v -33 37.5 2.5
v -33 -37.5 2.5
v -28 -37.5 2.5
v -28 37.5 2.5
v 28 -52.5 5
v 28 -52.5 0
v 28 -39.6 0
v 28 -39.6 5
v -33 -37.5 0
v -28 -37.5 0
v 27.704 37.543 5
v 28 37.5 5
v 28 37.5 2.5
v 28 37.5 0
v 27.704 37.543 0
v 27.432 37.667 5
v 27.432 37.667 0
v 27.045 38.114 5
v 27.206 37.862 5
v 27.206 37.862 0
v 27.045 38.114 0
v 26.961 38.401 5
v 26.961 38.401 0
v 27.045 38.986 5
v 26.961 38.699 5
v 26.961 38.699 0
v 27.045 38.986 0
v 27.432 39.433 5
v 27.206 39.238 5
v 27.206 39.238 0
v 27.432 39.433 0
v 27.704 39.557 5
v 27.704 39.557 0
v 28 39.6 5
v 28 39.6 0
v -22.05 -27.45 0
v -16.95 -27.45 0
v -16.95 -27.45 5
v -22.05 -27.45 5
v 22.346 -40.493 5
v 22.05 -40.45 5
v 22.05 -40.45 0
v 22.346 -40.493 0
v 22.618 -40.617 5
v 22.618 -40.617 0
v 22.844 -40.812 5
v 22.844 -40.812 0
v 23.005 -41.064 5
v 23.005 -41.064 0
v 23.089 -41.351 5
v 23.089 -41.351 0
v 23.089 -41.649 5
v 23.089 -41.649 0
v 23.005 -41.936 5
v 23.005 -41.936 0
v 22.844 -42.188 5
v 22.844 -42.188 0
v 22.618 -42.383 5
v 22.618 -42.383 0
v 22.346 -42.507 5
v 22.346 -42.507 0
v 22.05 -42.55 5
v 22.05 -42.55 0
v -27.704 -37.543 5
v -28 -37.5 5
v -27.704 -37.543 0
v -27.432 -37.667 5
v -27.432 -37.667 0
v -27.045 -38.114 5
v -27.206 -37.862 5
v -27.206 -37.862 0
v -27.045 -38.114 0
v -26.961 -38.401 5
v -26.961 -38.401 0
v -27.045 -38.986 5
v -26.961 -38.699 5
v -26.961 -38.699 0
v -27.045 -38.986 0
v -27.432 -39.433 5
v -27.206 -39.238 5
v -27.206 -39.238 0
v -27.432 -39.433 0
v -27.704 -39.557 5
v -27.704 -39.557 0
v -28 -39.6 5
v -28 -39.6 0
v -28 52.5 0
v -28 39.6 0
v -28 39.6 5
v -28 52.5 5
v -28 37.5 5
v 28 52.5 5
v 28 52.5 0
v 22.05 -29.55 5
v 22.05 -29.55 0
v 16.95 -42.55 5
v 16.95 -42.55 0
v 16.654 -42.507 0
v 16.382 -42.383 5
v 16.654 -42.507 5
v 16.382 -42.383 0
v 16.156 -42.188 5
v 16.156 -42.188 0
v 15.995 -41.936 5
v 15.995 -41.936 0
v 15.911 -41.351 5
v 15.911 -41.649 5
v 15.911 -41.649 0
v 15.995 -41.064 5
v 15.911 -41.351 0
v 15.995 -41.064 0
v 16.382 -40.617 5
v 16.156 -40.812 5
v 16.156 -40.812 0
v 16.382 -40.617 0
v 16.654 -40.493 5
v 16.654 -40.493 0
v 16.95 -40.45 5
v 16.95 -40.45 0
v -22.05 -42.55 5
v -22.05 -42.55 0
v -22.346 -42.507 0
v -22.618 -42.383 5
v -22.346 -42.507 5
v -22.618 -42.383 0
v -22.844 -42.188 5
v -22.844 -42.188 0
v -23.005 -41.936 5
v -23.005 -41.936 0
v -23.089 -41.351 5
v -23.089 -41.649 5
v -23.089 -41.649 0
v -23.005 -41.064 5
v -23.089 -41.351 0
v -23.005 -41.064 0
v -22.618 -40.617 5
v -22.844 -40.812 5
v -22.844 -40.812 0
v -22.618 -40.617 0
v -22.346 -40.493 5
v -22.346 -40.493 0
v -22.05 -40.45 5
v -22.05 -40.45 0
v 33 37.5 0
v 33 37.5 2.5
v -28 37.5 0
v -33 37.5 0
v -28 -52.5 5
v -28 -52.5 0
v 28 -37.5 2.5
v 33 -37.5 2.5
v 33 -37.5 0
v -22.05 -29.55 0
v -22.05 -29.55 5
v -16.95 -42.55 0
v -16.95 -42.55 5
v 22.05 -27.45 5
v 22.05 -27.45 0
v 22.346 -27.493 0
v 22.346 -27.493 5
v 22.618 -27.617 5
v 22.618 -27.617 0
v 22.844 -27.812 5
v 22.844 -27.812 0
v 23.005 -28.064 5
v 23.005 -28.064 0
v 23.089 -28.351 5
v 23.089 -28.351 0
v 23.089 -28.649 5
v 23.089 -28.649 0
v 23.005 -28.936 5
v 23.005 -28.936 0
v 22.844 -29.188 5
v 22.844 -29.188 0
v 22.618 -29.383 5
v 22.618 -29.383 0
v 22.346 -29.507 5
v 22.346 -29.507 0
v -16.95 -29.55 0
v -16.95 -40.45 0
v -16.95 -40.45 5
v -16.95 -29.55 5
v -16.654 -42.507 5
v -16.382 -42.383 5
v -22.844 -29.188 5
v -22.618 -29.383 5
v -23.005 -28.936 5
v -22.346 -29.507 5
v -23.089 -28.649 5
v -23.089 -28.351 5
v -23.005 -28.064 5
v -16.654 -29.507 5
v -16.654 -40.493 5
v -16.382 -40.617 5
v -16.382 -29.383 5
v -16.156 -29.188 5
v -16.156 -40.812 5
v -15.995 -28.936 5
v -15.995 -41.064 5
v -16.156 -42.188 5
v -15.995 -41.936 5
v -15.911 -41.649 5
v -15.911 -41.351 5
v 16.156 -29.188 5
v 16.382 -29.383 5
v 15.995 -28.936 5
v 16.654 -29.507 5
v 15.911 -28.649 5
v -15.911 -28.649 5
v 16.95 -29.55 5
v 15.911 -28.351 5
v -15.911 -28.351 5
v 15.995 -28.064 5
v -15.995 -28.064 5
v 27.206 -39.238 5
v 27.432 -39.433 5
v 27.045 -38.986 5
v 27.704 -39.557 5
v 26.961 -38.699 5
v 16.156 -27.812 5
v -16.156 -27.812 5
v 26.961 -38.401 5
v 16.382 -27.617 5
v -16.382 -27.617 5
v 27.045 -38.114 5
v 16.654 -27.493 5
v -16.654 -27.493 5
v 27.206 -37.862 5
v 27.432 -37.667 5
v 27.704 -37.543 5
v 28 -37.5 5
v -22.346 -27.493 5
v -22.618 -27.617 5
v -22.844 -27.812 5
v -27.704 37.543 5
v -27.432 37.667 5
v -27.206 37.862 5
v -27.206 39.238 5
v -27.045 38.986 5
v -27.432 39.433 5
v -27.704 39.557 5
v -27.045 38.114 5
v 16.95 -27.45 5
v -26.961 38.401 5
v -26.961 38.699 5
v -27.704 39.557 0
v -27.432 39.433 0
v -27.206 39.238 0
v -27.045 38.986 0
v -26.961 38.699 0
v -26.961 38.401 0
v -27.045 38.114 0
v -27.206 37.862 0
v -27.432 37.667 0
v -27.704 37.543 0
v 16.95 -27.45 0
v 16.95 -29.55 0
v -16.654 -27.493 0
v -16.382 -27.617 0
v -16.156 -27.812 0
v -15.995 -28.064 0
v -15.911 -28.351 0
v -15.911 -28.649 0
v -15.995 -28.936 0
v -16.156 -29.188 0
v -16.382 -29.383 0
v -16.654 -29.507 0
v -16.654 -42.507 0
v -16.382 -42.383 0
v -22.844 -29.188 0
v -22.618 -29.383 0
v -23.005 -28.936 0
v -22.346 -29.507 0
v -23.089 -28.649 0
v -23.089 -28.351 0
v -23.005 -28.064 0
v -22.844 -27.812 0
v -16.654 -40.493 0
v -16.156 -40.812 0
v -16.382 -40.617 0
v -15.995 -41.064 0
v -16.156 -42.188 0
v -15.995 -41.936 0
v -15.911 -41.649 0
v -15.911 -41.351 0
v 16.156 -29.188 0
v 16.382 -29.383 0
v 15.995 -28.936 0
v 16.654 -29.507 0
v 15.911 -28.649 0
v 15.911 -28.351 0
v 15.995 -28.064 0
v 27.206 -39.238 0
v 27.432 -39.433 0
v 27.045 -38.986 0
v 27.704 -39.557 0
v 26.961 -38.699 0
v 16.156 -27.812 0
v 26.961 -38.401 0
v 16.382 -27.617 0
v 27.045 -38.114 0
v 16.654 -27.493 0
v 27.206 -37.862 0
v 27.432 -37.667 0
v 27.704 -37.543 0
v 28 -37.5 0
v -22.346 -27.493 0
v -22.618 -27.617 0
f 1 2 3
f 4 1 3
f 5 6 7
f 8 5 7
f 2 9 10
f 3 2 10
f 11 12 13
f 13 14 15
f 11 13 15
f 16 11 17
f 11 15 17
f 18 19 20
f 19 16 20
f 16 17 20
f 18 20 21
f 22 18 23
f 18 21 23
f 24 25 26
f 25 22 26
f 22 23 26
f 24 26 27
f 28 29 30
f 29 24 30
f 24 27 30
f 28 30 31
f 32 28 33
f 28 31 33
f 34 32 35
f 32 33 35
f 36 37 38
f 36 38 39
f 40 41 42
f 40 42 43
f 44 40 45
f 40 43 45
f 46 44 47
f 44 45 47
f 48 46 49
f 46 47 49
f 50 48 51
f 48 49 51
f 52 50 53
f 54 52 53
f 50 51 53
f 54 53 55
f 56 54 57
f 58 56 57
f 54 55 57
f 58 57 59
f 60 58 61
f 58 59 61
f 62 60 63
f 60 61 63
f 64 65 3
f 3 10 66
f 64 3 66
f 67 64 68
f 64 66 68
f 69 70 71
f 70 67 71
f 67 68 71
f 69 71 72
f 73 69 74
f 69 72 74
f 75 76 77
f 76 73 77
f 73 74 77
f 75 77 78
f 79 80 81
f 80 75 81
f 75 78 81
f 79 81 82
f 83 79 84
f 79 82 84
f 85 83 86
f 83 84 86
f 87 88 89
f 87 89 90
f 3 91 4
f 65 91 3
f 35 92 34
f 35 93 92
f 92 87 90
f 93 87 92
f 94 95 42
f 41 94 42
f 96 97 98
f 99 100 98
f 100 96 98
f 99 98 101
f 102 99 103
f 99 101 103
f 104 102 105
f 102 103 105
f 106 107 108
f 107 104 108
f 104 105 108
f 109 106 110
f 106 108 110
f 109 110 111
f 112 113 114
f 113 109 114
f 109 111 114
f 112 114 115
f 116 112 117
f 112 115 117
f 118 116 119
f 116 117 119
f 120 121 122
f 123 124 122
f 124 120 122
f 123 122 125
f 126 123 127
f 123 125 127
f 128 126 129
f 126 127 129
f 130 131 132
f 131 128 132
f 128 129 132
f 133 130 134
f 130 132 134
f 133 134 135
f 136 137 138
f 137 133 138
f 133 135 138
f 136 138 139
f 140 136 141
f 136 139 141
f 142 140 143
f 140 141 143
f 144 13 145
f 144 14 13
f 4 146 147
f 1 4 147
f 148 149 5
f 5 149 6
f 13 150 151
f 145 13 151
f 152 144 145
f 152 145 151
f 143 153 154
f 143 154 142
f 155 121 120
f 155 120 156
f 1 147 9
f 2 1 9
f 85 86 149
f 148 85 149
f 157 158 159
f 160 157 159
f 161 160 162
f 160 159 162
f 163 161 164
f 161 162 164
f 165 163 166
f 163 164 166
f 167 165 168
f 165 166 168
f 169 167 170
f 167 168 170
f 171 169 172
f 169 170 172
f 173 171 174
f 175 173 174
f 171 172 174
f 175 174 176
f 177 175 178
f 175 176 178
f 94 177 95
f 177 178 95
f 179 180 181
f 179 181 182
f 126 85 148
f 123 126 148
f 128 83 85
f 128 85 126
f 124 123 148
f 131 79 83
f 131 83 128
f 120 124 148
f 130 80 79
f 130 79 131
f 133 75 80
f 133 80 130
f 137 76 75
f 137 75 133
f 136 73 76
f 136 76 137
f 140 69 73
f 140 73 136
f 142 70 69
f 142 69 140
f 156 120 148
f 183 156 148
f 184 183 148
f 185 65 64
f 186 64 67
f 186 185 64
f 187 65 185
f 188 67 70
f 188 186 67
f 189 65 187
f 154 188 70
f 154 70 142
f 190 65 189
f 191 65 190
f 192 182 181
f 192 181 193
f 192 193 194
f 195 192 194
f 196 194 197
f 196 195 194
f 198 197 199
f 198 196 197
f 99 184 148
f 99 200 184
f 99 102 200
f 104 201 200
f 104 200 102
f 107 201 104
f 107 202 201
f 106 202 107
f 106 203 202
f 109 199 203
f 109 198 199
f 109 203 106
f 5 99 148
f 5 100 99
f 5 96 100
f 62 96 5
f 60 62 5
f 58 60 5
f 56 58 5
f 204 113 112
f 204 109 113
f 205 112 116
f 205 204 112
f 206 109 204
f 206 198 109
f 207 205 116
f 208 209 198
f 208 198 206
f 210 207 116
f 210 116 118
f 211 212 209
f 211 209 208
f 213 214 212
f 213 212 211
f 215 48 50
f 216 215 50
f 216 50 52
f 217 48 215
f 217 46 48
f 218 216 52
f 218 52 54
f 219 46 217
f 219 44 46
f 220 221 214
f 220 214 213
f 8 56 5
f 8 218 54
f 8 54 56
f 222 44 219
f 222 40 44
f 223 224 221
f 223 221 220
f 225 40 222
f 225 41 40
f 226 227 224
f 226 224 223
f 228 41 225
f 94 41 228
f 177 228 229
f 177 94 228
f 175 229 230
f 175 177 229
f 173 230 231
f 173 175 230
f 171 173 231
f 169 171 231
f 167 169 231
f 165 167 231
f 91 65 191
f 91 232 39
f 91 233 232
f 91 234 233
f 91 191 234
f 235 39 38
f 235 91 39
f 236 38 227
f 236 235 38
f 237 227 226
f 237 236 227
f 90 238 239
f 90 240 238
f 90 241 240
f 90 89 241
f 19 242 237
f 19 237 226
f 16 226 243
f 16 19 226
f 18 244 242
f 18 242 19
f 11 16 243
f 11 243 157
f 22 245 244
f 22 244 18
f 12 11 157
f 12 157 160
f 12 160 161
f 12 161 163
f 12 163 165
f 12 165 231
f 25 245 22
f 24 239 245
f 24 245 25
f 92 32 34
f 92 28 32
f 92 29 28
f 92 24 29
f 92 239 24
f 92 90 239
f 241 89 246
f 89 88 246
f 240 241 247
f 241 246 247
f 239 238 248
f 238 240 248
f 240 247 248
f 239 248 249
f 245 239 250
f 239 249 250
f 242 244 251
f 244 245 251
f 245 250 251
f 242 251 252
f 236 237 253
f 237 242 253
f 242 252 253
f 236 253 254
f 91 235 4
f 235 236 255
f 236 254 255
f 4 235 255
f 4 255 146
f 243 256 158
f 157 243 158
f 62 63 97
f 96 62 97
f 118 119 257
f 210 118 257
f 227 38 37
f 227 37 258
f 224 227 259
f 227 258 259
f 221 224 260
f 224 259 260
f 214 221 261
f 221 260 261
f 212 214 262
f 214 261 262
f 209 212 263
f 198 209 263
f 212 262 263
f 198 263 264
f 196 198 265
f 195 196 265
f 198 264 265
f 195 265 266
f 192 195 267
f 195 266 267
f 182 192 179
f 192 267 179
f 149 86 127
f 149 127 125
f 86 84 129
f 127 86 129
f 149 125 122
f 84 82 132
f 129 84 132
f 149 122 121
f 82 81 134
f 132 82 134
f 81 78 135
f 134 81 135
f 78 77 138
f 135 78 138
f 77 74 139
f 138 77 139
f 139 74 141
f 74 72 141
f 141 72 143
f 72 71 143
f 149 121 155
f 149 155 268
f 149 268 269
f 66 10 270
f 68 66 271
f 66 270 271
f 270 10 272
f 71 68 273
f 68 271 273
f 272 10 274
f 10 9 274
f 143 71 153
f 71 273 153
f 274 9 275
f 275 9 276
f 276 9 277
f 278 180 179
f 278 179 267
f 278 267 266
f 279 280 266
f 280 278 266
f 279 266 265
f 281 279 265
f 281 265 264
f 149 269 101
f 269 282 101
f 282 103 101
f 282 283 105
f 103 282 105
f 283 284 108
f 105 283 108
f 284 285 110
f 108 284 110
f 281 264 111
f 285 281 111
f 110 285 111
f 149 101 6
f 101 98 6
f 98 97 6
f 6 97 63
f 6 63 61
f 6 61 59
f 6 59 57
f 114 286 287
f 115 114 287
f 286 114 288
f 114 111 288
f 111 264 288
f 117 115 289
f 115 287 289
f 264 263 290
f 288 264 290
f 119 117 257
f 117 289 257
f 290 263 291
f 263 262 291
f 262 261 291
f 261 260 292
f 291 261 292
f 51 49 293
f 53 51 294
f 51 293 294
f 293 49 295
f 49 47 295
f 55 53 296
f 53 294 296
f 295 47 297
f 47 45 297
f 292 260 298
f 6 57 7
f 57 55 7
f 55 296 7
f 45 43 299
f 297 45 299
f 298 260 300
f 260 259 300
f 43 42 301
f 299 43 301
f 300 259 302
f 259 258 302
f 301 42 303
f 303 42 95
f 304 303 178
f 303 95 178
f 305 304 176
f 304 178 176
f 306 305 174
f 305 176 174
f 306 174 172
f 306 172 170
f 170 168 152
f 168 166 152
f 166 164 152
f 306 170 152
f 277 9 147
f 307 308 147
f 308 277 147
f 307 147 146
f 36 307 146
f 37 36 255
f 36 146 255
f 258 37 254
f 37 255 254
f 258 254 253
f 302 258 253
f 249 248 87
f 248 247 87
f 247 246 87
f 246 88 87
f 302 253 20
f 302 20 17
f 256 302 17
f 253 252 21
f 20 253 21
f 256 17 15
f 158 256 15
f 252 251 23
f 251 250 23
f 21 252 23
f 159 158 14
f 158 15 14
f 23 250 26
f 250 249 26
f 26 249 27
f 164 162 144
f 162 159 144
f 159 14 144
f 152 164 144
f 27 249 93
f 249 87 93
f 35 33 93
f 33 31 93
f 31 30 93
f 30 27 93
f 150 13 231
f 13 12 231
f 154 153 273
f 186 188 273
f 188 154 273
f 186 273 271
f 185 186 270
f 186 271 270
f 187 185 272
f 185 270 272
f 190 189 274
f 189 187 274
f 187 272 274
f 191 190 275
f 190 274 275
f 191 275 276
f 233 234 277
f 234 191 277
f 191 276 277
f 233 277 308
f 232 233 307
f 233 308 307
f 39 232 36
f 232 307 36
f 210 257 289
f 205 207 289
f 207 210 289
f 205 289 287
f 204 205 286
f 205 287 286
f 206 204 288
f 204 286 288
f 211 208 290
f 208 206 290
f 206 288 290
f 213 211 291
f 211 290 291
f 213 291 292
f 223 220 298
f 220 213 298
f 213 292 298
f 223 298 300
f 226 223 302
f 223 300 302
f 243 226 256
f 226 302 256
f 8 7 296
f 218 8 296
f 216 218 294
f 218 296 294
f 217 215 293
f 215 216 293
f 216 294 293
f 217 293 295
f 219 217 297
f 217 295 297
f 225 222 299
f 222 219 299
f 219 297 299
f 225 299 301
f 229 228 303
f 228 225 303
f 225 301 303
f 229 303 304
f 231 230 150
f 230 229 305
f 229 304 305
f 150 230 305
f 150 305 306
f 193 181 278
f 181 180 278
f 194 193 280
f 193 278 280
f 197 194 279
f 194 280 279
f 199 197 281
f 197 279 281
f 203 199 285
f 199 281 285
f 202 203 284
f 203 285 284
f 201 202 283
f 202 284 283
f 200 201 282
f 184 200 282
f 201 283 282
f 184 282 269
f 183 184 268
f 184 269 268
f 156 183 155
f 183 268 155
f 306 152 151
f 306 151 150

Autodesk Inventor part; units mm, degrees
ref_plane "YZ Plane" through (0, 0, 0) normal (1, 0, 0) x (0, 1, 0)
ref_plane "XZ Plane" through (0, 0, 0) normal (0, 1, 0) x (-1, 0, 0)
ref_plane "XY Plane" through (0, 0, 0) normal (0, 0, 1) x (1, 0, 0)
sketch "スケッチ1" plane through (0, 0, 0) normal (0, 0, 1) x (1, 0, 0)
  line L0 (-28, -52.5) -> (28, -52.5) construction
  line L1 (28, -52.5) -> (28, 52.5) construction
  line L2 (28, 52.5) -> (-28, 52.5) construction
  line L3 (-28, 52.5) -> (-28, -52.5) construction
  line L4 (-28, -52.5) -> (28, 52.5) construction
  line L5 (28, -52.5) -> (-28, 52.5) construction
  line L6 (-28, 39.6) -> (-28, 52.5)
  line L7 (-28, 52.5) -> (28, 52.5)
  line L8 (28, 52.5) -> (28, 39.6)
  line L9 (-28, 37.5) -> (-33, 37.5)
  line L10 (-33, 37.5) -> (-33, -37.5)
  line L11 (-33, -37.5) -> (-28, -37.5)
  line L12 (-28, -39.6) -> (-28, -52.5)
  line L13 (-28, -52.5) -> (28, -52.5)
  line L14 (28, -52.5) -> (28, -39.6)
  line L15 (28, 37.5) -> (33, 37.5)
  line L16 (33, 37.5) -> (33, -37.5)
  line L17 (33, -37.5) -> (28, -37.5)
  arc A0 (-28, 37.5) -> (-28, 39.6) centre (-28, 38.55) ccw
  arc A1 (-28, -39.6) -> (-28, -37.5) centre (-28, -38.55) ccw
  arc A2 (28, -37.5) -> (28, -39.6) centre (28, -38.55) ccw
  line L18 (0, 0) -> (0, 52.5) construction
  line L19 (0, 0) -> (28, 0) construction
  arc A3 (28, 39.6) -> (28, 37.5) centre (28, 38.55) ccw
  line L20 (-24.5, 44.5) -> (24.5, 44.5) construction
  line L21 (24.5, 44.5) -> (24.5, -13.5) construction
  line L22 (24.5, -13.5) -> (-24.5, -13.5) construction
  line L23 (-24.5, -13.5) -> (-24.5, 44.5) construction
  line L24 (-24.5, 44.5) -> (24.5, -13.5) construction
  line L25 (24.5, 44.5) -> (-24.5, -13.5) construction
  circle A4 centre (-24.5, 44.5) radius 1.04
  circle A5 centre (-24.5, -13.5) radius 1.04
  circle A6 centre (24.5, -13.5) radius 1.04
  circle A7 centre (24.5, 44.5) radius 1.04
  line L26 (-22, -27.5) -> (-17, -27.5) construction
  line L27 (-17, -27.5) -> (-17, -42.5) construction
  line L28 (-17, -42.5) -> (-22, -42.5) construction
  line L29 (-22, -42.5) -> (-22, -27.5) construction
  circle A8 centre (-19.5, -21.5) radius 1.55
  circle A9 centre (-19.5, -48.5) radius 1.55
  line L30 (-17, -35) -> (-22, -35) construction
  line L31 (-22, -17.5) -> (-17, -17.5) construction
  line L32 (-17, -17.5) -> (-17, -52.5) construction
  line L33 (-17, -52.5) -> (-22, -52.5) construction
  line L34 (-22, -52.5) -> (-22, -17.5) construction
  circle A10 centre (-19.5, -48.5) radius 3 construction
  line L35 (-16.95, -27.45) -> (-22.05, -27.45)
  line L36 (-22.05, -27.45) -> (-22.05, -42.55)
  line L37 (-22.05, -42.55) -> (-16.95, -42.55)
  line L38 (-16.95, -42.55) -> (-16.95, -27.45)
  circle A11 centre (-22.05, -28.5) radius 1.05
  circle A12 centre (-16.95, -28.5) radius 1.05
  circle A13 centre (-22.05, -41.5) radius 1.05
  circle A14 centre (-16.95, -41.5) radius 1.05
  circle A15 centre (19.5, -21.5) radius 1.55
  circle A16 centre (19.5, -48.5) radius 1.55
  line L39 (16.95, -27.45) -> (22.05, -27.45)
  line L40 (22.05, -27.45) -> (22.05, -42.55)
  line L41 (22.05, -42.55) -> (16.95, -42.55)
  line L42 (16.95, -42.55) -> (16.95, -27.45)
  circle A17 centre (22.05, -28.5) radius 1.05
  circle A18 centre (16.95, -28.5) radius 1.05
  circle A19 centre (22.05, -41.5) radius 1.05
  circle A20 centre (16.95, -41.5) radius 1.05
  point P0 (0, 15.5)
  point P1 (0, 15.5)
  point P2 (0, 0)
  point P3 (-19.5, -35)
  point P4 (-19.5, -17.5)
  dimension "d93" = 2.1
  dimension "d9" = 56
  dimension "d12" = 105
  dimension "d13" = 15
  dimension "d39" = 15
  dimension "d40" = 1.05
  dimension "d41" = 5
  dimension "d52" = 2.08
  dimension "d53" = 49
  dimension "d54" = 58
  dimension "d55" = 8
  dimension "d73" = 35
  dimension "d83" = 5
  dimension "d87" = 3.1
  dimension "d88" = 10
  dimension "d89" = 27
  dimension "d90" = 6
  dimension "d91" = 22
  dimension "d92" = 0.05
extrude "押し出し1" add sketch "スケッチ1" along normal blind 5
sketch "スケッチ2" plane through (0, 0, 5) normal (0, 0, 1) x (1, 0, 0)
  line L0 (-28, 52.5) -> (-28, 39.6) projected
  line L1 (28, 52.5) -> (-28, 52.5) projected
  line L2 (-67.7785, 43.014) -> (-28, 43.014)
  line L3 (-28, 43.014) -> (-28, -43.014)
  line L4 (-28, -43.014) -> (-67.7785, -43.014)
  line L5 (-67.7785, -43.014) -> (-67.7785, 43.014)
  line L6 (67.7785, 43.014) -> (28, 43.014)
  line L7 (28, 43.014) -> (28, -43.014)
  line L8 (28, -43.014) -> (67.7785, -43.014)
  line L9 (67.7785, -43.014) -> (67.7785, 43.014)
  line L10 (0, 0) -> (0, 52.5) construction
  line L11 (0, 0) -> (33, 0) construction
  line L12 (33, 37.5) -> (33, -37.5) construction
extrude "押し出し2" cut sketch "スケッチ2" against normal blind 2.5
sketch "スケッチ5" plane through (0, 0, 0) normal (0, 0, -1) x (-1, 0, 0)
  circle A0 centre (-24.5, 44.5) radius 1.04 projected
  circle A1 centre (-24.5, 44.5) radius 1.04
  circle A2 centre (24.5, 44.5) radius 1.04 projected
  circle A3 centre (24.5, 44.5) radius 1.04
  circle A4 centre (24.5, -13.5) radius 1.04 projected
  circle A5 centre (24.5, -13.5) radius 1.04
  circle A6 centre (-24.5, -13.5) radius 1.04 projected
  circle A7 centre (-24.5, -13.5) radius 1.04
  circle A8 centre (-19.5, -21.5) radius 1.55 projected
  circle A9 centre (-19.5, -21.5) radius 1.55
  circle A10 centre (19.5, -21.5) radius 1.55 projected
  circle A11 centre (19.5, -21.5) radius 1.55
  circle A12 centre (-19.5, -48.5) radius 1.55 projected
  circle A13 centre (-19.5, -48.5) radius 1.55
  circle A14 centre (19.5, -48.5) radius 1.55 projected
  circle A15 centre (19.5, -48.5) radius 1.55
  point P0 (0, 0)
extrude "押し出し5" add sketch "スケッチ5" against normal up to surface (5 mm away)
equation "\"d12\" = d19"
equation "\"d13\" = d26"
equation "\"d39\" = d27"
equation "\"d55\" = d69"
equation "\"d73\" = d1_1_2 + 2 * d2_1"
equation "\"d88\" = d2_1"
equation "\"d19\" = 105"
equation "\"d26\" = 15"
equation "\"d27\" = 15"
equation "\"d69\" = 8"
equation "\"d1_1_2\" = 15"
equation "\"d2_1\" = 10"
properties part number "コックピット_2_サブフレーム_1" material "アセタール樹脂、黒"
